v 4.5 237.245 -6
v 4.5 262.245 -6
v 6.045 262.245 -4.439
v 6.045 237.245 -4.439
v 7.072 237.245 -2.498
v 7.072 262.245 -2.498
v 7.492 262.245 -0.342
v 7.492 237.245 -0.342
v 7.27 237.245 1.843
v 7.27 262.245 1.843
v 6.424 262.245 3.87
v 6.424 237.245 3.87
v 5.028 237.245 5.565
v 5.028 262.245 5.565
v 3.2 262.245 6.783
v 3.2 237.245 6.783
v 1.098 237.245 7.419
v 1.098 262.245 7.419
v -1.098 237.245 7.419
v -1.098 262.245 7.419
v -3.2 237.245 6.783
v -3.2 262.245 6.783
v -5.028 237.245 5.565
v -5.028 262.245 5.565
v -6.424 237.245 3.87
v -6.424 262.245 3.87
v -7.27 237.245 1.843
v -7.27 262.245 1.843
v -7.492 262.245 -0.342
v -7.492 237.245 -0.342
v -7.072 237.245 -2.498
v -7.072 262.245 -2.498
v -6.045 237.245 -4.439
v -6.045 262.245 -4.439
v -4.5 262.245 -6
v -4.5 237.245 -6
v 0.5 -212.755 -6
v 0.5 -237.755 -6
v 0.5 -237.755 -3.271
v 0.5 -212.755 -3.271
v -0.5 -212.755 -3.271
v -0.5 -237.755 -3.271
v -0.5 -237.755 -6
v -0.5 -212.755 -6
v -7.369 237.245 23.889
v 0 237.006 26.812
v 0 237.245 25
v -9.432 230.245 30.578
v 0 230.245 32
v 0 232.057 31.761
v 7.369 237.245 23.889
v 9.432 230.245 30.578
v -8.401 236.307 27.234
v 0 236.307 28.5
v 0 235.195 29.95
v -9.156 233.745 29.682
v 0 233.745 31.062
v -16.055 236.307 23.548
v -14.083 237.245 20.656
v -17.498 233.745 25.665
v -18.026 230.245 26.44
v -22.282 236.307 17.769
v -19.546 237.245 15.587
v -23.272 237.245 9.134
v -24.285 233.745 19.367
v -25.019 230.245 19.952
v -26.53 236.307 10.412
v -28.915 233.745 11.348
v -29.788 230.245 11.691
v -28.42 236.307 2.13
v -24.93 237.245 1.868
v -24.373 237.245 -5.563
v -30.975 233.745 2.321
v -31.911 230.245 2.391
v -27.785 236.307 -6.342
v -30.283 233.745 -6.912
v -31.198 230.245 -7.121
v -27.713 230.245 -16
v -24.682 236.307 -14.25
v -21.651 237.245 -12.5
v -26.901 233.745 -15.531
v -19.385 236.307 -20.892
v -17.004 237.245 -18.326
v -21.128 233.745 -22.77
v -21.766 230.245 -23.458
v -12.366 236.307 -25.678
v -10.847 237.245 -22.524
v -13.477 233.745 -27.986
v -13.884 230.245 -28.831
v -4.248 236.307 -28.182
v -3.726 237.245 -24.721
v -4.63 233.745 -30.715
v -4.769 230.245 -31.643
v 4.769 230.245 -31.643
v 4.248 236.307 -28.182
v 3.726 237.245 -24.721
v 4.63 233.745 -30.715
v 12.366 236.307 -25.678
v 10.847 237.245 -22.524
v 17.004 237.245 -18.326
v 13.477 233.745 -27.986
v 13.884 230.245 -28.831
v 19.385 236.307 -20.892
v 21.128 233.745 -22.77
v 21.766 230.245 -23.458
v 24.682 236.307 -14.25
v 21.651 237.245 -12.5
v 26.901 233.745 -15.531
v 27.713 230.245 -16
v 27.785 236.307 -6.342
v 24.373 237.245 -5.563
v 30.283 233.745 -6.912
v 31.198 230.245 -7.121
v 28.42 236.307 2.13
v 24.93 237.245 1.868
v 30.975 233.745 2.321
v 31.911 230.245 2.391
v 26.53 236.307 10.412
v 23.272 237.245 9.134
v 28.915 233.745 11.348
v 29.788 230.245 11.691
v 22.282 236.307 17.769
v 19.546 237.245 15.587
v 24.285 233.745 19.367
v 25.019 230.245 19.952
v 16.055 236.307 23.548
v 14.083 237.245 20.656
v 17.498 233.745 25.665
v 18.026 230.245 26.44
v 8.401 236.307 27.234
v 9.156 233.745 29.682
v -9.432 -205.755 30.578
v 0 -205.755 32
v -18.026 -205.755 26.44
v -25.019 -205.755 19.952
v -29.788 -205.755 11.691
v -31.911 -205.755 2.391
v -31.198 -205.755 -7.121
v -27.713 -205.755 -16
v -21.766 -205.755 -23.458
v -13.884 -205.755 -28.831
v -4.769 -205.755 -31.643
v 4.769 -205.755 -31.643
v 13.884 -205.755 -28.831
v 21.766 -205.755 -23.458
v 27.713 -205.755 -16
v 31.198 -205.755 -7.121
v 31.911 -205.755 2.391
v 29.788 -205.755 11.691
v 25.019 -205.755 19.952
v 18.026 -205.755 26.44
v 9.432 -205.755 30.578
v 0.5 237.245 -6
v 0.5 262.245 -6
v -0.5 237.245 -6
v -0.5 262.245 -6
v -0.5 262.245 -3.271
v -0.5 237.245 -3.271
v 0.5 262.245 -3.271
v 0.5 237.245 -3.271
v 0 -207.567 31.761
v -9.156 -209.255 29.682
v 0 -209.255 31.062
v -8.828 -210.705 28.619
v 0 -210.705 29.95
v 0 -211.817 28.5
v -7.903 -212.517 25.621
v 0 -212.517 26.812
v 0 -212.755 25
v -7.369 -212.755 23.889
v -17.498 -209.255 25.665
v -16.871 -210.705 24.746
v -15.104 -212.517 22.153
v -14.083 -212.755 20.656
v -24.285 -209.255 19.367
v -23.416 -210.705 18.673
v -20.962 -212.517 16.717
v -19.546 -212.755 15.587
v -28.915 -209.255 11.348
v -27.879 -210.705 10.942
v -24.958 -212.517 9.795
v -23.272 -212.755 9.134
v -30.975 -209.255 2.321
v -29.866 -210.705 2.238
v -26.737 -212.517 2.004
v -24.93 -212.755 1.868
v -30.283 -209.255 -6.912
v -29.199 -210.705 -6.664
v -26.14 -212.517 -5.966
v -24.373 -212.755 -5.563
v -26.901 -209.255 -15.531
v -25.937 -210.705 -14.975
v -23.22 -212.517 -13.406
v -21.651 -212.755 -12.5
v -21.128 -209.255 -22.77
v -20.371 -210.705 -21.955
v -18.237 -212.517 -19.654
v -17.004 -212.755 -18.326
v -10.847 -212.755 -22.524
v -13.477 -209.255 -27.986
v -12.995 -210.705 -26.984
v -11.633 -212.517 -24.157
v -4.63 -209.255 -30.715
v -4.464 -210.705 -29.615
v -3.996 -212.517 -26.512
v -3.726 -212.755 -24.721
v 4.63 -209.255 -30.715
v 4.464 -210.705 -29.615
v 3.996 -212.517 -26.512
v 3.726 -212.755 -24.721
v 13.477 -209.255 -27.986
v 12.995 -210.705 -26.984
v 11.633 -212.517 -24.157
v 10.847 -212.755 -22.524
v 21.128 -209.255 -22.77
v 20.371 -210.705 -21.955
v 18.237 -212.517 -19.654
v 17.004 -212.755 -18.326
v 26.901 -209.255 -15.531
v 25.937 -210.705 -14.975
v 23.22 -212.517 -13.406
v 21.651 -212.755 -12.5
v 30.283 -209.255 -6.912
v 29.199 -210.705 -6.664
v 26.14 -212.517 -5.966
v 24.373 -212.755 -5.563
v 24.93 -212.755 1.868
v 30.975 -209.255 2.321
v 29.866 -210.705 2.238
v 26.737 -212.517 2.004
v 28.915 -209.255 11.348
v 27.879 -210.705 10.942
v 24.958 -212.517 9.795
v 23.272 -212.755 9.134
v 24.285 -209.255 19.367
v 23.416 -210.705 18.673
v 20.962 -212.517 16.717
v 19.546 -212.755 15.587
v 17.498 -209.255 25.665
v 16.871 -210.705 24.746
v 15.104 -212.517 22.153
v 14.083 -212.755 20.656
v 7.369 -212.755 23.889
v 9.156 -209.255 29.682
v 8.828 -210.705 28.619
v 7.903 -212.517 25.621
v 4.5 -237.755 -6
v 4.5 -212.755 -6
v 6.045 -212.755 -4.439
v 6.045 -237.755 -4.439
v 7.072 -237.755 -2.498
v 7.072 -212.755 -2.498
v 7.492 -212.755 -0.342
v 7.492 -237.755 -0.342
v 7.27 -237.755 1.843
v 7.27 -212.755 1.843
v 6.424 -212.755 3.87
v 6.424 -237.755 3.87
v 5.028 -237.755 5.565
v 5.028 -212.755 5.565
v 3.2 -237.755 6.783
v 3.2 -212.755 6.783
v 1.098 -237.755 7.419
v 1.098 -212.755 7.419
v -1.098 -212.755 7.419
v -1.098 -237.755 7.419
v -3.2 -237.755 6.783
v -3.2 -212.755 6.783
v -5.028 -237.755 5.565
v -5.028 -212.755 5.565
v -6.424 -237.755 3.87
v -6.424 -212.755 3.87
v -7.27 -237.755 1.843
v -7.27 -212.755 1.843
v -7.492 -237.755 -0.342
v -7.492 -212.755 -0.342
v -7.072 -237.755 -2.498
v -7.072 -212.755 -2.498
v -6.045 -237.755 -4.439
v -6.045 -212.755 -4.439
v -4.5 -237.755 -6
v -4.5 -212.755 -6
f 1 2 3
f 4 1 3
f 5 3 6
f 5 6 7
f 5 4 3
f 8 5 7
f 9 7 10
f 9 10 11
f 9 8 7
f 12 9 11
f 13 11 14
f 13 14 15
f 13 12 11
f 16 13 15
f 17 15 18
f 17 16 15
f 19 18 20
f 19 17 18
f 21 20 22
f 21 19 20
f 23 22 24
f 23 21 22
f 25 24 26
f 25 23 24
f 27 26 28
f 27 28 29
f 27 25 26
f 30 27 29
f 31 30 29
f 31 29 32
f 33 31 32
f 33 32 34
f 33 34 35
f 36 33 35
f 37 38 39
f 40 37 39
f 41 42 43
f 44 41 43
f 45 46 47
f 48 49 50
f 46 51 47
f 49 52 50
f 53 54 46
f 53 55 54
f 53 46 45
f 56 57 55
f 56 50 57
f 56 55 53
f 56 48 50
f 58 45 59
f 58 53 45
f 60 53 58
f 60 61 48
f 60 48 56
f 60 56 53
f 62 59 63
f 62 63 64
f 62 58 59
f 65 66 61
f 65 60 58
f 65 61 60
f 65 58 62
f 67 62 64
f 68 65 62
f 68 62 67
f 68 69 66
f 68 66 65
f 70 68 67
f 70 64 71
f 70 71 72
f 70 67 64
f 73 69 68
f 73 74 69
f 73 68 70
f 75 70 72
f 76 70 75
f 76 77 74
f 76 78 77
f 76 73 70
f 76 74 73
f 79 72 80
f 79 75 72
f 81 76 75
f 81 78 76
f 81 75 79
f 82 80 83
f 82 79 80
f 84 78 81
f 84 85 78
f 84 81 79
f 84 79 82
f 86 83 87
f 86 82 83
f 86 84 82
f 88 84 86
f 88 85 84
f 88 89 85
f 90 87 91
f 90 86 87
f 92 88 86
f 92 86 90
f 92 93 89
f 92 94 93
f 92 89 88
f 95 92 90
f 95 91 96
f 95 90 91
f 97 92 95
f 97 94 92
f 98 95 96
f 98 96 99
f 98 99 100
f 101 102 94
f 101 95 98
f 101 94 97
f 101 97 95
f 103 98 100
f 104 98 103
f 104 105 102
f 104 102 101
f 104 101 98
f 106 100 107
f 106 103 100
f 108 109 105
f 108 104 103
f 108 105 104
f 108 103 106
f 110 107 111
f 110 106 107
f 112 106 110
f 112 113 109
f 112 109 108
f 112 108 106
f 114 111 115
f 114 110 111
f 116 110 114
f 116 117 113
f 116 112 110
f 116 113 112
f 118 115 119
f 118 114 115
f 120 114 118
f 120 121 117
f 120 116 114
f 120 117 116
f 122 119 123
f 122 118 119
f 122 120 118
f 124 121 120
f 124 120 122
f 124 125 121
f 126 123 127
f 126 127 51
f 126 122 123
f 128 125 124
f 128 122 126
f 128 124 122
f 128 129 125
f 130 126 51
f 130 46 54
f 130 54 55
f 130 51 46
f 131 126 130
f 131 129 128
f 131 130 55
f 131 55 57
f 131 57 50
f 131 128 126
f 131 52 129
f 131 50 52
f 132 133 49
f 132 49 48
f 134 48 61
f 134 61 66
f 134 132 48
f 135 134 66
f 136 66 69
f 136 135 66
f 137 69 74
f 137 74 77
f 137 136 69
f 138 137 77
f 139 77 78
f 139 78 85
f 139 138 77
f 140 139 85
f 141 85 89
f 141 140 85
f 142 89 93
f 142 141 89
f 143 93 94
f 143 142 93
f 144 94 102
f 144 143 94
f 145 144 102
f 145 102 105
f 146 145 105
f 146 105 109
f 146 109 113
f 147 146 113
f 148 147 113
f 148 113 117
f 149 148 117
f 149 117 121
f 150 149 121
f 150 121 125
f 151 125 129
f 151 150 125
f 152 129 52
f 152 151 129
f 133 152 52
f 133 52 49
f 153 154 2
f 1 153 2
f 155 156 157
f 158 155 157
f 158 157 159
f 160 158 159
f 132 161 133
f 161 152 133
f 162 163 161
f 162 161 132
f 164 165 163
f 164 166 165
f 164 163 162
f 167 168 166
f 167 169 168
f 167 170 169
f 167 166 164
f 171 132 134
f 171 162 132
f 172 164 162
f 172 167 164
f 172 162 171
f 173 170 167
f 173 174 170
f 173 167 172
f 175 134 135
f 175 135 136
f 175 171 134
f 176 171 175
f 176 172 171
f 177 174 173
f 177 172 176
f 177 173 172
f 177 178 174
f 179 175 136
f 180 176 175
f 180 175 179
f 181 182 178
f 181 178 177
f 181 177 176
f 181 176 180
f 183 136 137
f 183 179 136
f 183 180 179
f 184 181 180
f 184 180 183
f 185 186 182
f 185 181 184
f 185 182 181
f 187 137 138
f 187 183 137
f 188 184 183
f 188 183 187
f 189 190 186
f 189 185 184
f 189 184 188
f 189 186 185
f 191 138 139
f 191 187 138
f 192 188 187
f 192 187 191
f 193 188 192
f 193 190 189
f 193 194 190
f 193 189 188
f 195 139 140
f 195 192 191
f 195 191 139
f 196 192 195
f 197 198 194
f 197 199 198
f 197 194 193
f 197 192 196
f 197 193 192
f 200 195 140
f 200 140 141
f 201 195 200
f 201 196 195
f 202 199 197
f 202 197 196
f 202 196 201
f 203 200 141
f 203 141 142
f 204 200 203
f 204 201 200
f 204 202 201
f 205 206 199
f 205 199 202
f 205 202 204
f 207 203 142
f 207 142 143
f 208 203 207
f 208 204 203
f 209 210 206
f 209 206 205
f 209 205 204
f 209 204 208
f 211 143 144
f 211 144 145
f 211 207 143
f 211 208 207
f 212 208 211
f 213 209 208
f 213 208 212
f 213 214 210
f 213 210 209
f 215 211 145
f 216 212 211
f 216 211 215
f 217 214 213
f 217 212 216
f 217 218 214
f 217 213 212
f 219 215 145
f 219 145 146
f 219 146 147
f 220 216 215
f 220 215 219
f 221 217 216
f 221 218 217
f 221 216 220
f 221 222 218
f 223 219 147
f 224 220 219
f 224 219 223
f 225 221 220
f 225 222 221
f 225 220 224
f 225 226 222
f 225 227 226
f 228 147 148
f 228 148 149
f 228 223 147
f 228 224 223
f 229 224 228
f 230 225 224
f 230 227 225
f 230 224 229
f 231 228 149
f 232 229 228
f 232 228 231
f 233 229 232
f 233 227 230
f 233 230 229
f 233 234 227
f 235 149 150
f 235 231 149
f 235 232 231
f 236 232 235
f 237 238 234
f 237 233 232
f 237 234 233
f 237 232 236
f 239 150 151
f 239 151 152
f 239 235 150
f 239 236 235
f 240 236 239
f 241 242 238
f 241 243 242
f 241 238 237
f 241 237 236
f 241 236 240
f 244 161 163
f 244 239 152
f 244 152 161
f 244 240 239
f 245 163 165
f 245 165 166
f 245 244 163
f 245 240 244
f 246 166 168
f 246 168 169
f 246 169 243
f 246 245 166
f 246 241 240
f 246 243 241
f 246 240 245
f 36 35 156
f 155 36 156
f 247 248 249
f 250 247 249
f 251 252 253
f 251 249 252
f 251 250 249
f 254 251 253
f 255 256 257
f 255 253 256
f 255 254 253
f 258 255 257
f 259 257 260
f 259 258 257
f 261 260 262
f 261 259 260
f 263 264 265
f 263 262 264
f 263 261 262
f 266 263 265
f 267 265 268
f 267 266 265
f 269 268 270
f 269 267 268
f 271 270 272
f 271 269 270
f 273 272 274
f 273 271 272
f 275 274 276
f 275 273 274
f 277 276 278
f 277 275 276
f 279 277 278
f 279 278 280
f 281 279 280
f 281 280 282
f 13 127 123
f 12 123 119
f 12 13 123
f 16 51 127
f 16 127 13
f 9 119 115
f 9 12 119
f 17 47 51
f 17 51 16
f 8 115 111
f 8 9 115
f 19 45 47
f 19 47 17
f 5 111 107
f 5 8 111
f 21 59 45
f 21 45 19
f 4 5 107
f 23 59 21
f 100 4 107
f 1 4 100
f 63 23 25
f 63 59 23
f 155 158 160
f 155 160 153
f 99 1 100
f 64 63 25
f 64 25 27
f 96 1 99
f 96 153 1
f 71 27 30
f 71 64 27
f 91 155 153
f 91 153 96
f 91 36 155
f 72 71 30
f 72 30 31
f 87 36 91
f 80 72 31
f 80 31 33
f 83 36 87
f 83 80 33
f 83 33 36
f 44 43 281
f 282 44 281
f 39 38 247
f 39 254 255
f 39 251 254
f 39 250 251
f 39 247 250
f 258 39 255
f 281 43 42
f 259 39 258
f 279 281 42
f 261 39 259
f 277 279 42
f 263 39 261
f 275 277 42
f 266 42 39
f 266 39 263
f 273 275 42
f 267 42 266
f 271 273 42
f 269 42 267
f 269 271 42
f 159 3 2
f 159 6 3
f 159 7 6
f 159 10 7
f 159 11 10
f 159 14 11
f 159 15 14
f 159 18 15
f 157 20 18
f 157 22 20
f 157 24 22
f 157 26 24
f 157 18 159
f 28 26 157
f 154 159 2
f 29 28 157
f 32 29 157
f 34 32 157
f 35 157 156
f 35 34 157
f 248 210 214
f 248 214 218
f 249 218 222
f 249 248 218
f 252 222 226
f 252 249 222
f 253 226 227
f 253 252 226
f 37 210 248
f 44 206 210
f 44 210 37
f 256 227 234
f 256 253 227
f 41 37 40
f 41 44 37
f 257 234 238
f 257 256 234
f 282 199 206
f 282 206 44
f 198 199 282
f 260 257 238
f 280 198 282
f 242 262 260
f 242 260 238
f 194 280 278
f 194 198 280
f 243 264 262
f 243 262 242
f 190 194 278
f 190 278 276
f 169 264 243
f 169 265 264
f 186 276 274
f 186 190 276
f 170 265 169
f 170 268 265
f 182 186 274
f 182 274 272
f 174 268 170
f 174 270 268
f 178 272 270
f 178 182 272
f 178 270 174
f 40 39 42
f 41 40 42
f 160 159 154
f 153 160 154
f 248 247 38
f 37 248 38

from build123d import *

# Parameters (mm, degrees)
F2_R     = 7
F4_DEPTH = 25
F6_DEPTH = 25


with BuildPart() as f1:
    # F0 (on Right) → F1 (revolve)
    with BuildSketch(Plane.YZ):
        Polygon((-237.755094, 7.5), (-237.755094, 0), (262.244906, 0), (262.244906, 7.5), (237.244906, 7.5), (237.244906, 32), (-212.755094, 32), (-212.755094, 7.5), align=None)
    revolve(axis=Axis((0, 12.244906, 0), (0, -1, 0)))

    # F2
    f2_edges = [f1.edges().sort_by_distance(p)[0] for p in [
        (0, -212.755094, -32),
        (0, 237.244906, -32),
    ]]
    fillet(f2_edges, radius=F2_R)

    # F3 (on face) → F4 (cut, through all)
    with BuildSketch(Plane.XZ.offset(237.755094)):
        Polygon((-0.5, -6), (-7.974903, -6), (-7.77278, -10.850932), (8.599116, -10.850932), (8.599116, -6), (0.5, -6), (0.5, -3.27135), (-0.5, -3.27135), align=None)
    extrude(amount=-F4_DEPTH, mode=Mode.SUBTRACT)

    # F5 (on face) → F6 (cut, through all)
    with BuildSketch(Plane(origin=(0, 262.244906, 0), x_dir=(-1, 0, 0), z_dir=(0, 1, 0))):
        Polygon((9.790156, -10.28766), (8.146554, -6), (0.5, -6), (0.5, -3.27135), (-0.5, -3.27135), (-0.5, -6), (-9.718692, -6), (-10.433301, -10.787886), align=None)
    extrude(amount=-F6_DEPTH, mode=Mode.SUBTRACT)


solid = f1.part
